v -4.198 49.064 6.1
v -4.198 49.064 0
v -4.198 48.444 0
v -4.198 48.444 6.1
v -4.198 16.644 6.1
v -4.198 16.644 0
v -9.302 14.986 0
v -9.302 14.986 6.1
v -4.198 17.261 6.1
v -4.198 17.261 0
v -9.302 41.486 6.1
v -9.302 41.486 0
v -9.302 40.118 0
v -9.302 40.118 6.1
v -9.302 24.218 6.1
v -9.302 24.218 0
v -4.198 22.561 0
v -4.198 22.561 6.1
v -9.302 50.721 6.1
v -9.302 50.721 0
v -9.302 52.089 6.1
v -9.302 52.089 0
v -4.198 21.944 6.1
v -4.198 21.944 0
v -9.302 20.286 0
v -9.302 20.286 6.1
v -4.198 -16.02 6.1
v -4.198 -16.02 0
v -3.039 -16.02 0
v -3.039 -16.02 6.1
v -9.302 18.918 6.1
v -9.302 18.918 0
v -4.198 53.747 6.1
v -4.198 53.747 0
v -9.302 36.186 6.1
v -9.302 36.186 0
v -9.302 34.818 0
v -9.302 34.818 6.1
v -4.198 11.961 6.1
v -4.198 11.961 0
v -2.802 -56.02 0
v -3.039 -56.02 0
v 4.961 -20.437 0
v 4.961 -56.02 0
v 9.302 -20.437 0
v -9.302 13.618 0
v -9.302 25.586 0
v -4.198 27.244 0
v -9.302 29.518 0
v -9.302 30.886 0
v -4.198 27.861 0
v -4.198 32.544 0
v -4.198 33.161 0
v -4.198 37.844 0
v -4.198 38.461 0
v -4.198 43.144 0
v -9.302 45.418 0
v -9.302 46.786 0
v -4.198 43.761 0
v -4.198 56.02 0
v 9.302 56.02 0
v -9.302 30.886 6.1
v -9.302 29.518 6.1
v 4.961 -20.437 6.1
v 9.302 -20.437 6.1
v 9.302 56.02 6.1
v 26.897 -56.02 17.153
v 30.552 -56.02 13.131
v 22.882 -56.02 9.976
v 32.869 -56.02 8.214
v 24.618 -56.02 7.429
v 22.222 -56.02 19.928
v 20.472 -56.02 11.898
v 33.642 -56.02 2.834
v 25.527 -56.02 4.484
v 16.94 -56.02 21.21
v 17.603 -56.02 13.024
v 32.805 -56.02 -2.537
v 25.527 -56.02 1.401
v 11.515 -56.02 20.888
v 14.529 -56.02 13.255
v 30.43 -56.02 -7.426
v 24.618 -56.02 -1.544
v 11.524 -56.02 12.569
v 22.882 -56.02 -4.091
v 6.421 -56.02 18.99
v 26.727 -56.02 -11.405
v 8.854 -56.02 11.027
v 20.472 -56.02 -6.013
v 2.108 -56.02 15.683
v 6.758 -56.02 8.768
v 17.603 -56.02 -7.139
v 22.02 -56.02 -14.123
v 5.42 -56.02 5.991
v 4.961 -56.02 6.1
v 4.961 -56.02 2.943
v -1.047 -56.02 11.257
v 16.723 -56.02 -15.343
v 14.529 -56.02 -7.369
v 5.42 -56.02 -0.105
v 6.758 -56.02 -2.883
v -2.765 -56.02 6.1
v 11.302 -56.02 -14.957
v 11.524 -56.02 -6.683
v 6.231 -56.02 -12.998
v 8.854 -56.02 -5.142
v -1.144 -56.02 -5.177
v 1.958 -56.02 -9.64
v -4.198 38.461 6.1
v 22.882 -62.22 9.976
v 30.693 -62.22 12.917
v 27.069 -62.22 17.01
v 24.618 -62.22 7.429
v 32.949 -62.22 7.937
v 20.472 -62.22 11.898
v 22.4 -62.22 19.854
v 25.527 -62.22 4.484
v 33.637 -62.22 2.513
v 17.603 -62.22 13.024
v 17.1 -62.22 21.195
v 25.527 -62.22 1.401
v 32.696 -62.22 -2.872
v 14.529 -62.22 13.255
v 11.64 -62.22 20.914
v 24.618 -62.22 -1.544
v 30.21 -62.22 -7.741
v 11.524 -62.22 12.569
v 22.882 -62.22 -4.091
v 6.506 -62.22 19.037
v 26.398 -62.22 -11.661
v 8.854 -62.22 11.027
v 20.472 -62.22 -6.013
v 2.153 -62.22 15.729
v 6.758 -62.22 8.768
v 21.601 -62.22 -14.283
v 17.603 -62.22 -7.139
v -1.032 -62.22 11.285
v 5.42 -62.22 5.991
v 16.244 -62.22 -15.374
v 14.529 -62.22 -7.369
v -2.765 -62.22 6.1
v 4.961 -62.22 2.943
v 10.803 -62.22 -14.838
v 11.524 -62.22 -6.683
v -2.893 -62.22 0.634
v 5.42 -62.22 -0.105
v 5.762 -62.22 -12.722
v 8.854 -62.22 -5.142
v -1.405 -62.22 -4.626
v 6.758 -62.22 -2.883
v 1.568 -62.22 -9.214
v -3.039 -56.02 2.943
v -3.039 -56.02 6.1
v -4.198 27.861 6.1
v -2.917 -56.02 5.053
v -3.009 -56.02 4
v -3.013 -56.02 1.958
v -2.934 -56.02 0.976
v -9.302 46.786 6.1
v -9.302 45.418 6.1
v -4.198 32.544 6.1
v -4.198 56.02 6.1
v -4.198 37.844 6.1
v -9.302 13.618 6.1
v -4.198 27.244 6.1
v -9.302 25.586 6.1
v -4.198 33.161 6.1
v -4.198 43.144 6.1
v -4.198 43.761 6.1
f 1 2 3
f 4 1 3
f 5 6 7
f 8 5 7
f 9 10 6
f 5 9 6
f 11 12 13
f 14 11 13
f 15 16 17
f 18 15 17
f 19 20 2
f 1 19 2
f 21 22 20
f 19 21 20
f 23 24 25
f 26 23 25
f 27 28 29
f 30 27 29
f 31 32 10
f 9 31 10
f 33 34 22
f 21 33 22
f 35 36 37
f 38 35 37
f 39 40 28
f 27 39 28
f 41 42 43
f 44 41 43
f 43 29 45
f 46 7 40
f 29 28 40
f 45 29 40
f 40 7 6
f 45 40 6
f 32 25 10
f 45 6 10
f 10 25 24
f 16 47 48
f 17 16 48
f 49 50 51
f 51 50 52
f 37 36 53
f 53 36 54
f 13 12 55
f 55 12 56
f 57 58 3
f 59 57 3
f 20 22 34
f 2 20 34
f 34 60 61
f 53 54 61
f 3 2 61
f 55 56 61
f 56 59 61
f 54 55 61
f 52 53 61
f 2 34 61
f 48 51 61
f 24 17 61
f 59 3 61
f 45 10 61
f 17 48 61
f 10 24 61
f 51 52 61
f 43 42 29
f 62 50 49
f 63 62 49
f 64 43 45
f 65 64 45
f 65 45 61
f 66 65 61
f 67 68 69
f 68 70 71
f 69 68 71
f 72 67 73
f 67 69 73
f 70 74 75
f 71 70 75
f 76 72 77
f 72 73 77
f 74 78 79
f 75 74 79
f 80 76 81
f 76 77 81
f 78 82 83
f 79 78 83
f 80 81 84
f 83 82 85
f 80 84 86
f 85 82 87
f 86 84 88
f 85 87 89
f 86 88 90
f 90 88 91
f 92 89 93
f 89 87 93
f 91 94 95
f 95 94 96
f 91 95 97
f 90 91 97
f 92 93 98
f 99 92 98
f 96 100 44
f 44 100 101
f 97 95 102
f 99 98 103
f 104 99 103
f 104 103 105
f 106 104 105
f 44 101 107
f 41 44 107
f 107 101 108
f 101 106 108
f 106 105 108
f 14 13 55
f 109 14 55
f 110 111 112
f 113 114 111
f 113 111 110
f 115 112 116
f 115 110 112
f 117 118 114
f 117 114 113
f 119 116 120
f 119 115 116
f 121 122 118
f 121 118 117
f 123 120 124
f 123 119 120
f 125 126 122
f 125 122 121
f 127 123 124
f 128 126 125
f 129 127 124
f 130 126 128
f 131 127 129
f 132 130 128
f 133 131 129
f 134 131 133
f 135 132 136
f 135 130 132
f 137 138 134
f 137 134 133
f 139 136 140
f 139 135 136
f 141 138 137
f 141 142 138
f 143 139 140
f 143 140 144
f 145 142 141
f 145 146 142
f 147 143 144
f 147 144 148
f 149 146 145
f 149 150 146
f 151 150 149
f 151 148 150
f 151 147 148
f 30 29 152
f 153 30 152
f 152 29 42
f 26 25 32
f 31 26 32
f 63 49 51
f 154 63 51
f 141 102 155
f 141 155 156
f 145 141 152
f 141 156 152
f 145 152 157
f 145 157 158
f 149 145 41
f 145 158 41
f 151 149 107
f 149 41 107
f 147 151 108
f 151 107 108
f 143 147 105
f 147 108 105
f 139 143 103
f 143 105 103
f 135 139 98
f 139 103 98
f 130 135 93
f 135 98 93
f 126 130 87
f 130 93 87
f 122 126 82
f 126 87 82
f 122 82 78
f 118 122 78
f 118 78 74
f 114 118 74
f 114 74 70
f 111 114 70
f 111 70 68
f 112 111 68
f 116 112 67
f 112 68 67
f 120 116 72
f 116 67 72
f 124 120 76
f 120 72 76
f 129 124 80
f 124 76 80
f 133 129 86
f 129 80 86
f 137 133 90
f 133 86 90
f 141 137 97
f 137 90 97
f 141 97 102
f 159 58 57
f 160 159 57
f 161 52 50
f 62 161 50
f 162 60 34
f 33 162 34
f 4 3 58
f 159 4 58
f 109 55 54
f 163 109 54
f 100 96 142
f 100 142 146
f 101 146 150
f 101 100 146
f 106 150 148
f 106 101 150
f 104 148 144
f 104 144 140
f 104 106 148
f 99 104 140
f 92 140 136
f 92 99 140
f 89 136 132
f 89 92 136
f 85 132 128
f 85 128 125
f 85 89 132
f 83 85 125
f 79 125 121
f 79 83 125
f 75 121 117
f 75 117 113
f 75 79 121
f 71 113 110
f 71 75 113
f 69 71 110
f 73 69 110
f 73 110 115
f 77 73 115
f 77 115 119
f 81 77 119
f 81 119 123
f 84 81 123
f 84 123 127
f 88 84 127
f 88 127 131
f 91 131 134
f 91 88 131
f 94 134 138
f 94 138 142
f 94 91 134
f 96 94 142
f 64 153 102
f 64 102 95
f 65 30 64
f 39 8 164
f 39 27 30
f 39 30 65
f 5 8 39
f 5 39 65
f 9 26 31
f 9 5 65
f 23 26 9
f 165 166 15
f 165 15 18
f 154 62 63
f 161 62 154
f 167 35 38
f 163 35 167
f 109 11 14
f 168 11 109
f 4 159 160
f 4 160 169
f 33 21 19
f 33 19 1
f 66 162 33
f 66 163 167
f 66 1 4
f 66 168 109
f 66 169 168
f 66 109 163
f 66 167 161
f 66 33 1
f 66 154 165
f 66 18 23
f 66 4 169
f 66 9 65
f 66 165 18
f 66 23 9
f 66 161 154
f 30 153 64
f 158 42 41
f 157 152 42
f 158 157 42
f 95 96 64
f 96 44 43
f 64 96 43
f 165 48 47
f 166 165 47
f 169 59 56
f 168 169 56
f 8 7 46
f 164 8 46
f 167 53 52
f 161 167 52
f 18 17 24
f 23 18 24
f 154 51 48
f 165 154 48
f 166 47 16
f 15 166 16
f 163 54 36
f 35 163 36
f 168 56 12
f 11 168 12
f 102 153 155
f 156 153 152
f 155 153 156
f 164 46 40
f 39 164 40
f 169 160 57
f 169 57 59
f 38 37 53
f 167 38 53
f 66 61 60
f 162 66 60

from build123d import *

# Parameters (mm, degrees)
BOSS_EXTRUDE1_DEPTH = 6.1
SKETCH3_R           = 18.340849868
SKETCH3_R_2         = 10.340849868
BOSS_EXTRUDE2_DEPTH = 6.2


with BuildPart() as part:
    # Sketch2 → Boss-Extrude1 (new body)
    with BuildSketch(Plane.XY):
        Polygon((9.301598931, 56.02003156), (-4.198401069, 56.02003156), (-4.198401069, 48.443721), (-4.198401069, -16.02003156), (-3.039250937, -16.02003156), (-3.039250937, -56.02003156), (4.960749063, -56.02003156), (4.960749063, -20.437234175), (9.301598931, -20.437234175), (9.301598931, 48.443721), align=None)
        Polygon((-4.198401069, 49.063721), (-4.198401069, 53.74676634), (-9.301598931, 52.089011931), (-9.301598931, 50.721475409), align=None)
        Polygon((-4.198401069, 43.76067566), (-4.198401069, 48.443721), (-9.301598931, 46.785966591), (-9.301598931, 45.418430069), align=None)
        Polygon((-4.198401069, 38.46067566), (-4.198401069, 43.143721), (-9.301598931, 41.485966591), (-9.301598931, 40.118430069), align=None)
        Polygon((-4.198401069, 33.16067566), (-4.198401069, 37.843721), (-9.301598931, 36.185966591), (-9.301598931, 34.818430069), align=None)
        Polygon((-4.198401069, 27.86067566), (-4.198401069, 32.543721), (-9.301598931, 30.885966591), (-9.301598931, 29.518430069), align=None)
        Polygon((-9.301598931, 24.218430069), (-4.198401069, 22.56067566), (-4.198401069, 27.243721), (-9.301598931, 25.585966591), align=None)
        Polygon((-9.301598931, 18.918430069), (-4.198401069, 17.26067566), (-4.198401069, 21.943721), (-9.301598931, 20.285966591), align=None)
        Polygon((-9.301598931, 13.618430069), (-4.198401069, 11.96067566), (-4.198401069, 16.643721), (-9.301598931, 14.985966591), align=None)
    extrude(amount=BOSS_EXTRUDE1_DEPTH)

    # Sketch3 → Boss-Extrude2 (add)
    with BuildSketch(Plane.XZ.offset(56.02003156)):
        with Locations(Location((15.301598931, 2.942643244, 0), (0, 0, 170.087216978))):
            Circle(SKETCH3_R)
        with Locations(Location((15.301598931, 2.942643244, 0), (0, 0, 180))):
            Circle(SKETCH3_R_2, mode=Mode.SUBTRACT)
    extrude(amount=BOSS_EXTRUDE2_DEPTH)


solid = part.part
